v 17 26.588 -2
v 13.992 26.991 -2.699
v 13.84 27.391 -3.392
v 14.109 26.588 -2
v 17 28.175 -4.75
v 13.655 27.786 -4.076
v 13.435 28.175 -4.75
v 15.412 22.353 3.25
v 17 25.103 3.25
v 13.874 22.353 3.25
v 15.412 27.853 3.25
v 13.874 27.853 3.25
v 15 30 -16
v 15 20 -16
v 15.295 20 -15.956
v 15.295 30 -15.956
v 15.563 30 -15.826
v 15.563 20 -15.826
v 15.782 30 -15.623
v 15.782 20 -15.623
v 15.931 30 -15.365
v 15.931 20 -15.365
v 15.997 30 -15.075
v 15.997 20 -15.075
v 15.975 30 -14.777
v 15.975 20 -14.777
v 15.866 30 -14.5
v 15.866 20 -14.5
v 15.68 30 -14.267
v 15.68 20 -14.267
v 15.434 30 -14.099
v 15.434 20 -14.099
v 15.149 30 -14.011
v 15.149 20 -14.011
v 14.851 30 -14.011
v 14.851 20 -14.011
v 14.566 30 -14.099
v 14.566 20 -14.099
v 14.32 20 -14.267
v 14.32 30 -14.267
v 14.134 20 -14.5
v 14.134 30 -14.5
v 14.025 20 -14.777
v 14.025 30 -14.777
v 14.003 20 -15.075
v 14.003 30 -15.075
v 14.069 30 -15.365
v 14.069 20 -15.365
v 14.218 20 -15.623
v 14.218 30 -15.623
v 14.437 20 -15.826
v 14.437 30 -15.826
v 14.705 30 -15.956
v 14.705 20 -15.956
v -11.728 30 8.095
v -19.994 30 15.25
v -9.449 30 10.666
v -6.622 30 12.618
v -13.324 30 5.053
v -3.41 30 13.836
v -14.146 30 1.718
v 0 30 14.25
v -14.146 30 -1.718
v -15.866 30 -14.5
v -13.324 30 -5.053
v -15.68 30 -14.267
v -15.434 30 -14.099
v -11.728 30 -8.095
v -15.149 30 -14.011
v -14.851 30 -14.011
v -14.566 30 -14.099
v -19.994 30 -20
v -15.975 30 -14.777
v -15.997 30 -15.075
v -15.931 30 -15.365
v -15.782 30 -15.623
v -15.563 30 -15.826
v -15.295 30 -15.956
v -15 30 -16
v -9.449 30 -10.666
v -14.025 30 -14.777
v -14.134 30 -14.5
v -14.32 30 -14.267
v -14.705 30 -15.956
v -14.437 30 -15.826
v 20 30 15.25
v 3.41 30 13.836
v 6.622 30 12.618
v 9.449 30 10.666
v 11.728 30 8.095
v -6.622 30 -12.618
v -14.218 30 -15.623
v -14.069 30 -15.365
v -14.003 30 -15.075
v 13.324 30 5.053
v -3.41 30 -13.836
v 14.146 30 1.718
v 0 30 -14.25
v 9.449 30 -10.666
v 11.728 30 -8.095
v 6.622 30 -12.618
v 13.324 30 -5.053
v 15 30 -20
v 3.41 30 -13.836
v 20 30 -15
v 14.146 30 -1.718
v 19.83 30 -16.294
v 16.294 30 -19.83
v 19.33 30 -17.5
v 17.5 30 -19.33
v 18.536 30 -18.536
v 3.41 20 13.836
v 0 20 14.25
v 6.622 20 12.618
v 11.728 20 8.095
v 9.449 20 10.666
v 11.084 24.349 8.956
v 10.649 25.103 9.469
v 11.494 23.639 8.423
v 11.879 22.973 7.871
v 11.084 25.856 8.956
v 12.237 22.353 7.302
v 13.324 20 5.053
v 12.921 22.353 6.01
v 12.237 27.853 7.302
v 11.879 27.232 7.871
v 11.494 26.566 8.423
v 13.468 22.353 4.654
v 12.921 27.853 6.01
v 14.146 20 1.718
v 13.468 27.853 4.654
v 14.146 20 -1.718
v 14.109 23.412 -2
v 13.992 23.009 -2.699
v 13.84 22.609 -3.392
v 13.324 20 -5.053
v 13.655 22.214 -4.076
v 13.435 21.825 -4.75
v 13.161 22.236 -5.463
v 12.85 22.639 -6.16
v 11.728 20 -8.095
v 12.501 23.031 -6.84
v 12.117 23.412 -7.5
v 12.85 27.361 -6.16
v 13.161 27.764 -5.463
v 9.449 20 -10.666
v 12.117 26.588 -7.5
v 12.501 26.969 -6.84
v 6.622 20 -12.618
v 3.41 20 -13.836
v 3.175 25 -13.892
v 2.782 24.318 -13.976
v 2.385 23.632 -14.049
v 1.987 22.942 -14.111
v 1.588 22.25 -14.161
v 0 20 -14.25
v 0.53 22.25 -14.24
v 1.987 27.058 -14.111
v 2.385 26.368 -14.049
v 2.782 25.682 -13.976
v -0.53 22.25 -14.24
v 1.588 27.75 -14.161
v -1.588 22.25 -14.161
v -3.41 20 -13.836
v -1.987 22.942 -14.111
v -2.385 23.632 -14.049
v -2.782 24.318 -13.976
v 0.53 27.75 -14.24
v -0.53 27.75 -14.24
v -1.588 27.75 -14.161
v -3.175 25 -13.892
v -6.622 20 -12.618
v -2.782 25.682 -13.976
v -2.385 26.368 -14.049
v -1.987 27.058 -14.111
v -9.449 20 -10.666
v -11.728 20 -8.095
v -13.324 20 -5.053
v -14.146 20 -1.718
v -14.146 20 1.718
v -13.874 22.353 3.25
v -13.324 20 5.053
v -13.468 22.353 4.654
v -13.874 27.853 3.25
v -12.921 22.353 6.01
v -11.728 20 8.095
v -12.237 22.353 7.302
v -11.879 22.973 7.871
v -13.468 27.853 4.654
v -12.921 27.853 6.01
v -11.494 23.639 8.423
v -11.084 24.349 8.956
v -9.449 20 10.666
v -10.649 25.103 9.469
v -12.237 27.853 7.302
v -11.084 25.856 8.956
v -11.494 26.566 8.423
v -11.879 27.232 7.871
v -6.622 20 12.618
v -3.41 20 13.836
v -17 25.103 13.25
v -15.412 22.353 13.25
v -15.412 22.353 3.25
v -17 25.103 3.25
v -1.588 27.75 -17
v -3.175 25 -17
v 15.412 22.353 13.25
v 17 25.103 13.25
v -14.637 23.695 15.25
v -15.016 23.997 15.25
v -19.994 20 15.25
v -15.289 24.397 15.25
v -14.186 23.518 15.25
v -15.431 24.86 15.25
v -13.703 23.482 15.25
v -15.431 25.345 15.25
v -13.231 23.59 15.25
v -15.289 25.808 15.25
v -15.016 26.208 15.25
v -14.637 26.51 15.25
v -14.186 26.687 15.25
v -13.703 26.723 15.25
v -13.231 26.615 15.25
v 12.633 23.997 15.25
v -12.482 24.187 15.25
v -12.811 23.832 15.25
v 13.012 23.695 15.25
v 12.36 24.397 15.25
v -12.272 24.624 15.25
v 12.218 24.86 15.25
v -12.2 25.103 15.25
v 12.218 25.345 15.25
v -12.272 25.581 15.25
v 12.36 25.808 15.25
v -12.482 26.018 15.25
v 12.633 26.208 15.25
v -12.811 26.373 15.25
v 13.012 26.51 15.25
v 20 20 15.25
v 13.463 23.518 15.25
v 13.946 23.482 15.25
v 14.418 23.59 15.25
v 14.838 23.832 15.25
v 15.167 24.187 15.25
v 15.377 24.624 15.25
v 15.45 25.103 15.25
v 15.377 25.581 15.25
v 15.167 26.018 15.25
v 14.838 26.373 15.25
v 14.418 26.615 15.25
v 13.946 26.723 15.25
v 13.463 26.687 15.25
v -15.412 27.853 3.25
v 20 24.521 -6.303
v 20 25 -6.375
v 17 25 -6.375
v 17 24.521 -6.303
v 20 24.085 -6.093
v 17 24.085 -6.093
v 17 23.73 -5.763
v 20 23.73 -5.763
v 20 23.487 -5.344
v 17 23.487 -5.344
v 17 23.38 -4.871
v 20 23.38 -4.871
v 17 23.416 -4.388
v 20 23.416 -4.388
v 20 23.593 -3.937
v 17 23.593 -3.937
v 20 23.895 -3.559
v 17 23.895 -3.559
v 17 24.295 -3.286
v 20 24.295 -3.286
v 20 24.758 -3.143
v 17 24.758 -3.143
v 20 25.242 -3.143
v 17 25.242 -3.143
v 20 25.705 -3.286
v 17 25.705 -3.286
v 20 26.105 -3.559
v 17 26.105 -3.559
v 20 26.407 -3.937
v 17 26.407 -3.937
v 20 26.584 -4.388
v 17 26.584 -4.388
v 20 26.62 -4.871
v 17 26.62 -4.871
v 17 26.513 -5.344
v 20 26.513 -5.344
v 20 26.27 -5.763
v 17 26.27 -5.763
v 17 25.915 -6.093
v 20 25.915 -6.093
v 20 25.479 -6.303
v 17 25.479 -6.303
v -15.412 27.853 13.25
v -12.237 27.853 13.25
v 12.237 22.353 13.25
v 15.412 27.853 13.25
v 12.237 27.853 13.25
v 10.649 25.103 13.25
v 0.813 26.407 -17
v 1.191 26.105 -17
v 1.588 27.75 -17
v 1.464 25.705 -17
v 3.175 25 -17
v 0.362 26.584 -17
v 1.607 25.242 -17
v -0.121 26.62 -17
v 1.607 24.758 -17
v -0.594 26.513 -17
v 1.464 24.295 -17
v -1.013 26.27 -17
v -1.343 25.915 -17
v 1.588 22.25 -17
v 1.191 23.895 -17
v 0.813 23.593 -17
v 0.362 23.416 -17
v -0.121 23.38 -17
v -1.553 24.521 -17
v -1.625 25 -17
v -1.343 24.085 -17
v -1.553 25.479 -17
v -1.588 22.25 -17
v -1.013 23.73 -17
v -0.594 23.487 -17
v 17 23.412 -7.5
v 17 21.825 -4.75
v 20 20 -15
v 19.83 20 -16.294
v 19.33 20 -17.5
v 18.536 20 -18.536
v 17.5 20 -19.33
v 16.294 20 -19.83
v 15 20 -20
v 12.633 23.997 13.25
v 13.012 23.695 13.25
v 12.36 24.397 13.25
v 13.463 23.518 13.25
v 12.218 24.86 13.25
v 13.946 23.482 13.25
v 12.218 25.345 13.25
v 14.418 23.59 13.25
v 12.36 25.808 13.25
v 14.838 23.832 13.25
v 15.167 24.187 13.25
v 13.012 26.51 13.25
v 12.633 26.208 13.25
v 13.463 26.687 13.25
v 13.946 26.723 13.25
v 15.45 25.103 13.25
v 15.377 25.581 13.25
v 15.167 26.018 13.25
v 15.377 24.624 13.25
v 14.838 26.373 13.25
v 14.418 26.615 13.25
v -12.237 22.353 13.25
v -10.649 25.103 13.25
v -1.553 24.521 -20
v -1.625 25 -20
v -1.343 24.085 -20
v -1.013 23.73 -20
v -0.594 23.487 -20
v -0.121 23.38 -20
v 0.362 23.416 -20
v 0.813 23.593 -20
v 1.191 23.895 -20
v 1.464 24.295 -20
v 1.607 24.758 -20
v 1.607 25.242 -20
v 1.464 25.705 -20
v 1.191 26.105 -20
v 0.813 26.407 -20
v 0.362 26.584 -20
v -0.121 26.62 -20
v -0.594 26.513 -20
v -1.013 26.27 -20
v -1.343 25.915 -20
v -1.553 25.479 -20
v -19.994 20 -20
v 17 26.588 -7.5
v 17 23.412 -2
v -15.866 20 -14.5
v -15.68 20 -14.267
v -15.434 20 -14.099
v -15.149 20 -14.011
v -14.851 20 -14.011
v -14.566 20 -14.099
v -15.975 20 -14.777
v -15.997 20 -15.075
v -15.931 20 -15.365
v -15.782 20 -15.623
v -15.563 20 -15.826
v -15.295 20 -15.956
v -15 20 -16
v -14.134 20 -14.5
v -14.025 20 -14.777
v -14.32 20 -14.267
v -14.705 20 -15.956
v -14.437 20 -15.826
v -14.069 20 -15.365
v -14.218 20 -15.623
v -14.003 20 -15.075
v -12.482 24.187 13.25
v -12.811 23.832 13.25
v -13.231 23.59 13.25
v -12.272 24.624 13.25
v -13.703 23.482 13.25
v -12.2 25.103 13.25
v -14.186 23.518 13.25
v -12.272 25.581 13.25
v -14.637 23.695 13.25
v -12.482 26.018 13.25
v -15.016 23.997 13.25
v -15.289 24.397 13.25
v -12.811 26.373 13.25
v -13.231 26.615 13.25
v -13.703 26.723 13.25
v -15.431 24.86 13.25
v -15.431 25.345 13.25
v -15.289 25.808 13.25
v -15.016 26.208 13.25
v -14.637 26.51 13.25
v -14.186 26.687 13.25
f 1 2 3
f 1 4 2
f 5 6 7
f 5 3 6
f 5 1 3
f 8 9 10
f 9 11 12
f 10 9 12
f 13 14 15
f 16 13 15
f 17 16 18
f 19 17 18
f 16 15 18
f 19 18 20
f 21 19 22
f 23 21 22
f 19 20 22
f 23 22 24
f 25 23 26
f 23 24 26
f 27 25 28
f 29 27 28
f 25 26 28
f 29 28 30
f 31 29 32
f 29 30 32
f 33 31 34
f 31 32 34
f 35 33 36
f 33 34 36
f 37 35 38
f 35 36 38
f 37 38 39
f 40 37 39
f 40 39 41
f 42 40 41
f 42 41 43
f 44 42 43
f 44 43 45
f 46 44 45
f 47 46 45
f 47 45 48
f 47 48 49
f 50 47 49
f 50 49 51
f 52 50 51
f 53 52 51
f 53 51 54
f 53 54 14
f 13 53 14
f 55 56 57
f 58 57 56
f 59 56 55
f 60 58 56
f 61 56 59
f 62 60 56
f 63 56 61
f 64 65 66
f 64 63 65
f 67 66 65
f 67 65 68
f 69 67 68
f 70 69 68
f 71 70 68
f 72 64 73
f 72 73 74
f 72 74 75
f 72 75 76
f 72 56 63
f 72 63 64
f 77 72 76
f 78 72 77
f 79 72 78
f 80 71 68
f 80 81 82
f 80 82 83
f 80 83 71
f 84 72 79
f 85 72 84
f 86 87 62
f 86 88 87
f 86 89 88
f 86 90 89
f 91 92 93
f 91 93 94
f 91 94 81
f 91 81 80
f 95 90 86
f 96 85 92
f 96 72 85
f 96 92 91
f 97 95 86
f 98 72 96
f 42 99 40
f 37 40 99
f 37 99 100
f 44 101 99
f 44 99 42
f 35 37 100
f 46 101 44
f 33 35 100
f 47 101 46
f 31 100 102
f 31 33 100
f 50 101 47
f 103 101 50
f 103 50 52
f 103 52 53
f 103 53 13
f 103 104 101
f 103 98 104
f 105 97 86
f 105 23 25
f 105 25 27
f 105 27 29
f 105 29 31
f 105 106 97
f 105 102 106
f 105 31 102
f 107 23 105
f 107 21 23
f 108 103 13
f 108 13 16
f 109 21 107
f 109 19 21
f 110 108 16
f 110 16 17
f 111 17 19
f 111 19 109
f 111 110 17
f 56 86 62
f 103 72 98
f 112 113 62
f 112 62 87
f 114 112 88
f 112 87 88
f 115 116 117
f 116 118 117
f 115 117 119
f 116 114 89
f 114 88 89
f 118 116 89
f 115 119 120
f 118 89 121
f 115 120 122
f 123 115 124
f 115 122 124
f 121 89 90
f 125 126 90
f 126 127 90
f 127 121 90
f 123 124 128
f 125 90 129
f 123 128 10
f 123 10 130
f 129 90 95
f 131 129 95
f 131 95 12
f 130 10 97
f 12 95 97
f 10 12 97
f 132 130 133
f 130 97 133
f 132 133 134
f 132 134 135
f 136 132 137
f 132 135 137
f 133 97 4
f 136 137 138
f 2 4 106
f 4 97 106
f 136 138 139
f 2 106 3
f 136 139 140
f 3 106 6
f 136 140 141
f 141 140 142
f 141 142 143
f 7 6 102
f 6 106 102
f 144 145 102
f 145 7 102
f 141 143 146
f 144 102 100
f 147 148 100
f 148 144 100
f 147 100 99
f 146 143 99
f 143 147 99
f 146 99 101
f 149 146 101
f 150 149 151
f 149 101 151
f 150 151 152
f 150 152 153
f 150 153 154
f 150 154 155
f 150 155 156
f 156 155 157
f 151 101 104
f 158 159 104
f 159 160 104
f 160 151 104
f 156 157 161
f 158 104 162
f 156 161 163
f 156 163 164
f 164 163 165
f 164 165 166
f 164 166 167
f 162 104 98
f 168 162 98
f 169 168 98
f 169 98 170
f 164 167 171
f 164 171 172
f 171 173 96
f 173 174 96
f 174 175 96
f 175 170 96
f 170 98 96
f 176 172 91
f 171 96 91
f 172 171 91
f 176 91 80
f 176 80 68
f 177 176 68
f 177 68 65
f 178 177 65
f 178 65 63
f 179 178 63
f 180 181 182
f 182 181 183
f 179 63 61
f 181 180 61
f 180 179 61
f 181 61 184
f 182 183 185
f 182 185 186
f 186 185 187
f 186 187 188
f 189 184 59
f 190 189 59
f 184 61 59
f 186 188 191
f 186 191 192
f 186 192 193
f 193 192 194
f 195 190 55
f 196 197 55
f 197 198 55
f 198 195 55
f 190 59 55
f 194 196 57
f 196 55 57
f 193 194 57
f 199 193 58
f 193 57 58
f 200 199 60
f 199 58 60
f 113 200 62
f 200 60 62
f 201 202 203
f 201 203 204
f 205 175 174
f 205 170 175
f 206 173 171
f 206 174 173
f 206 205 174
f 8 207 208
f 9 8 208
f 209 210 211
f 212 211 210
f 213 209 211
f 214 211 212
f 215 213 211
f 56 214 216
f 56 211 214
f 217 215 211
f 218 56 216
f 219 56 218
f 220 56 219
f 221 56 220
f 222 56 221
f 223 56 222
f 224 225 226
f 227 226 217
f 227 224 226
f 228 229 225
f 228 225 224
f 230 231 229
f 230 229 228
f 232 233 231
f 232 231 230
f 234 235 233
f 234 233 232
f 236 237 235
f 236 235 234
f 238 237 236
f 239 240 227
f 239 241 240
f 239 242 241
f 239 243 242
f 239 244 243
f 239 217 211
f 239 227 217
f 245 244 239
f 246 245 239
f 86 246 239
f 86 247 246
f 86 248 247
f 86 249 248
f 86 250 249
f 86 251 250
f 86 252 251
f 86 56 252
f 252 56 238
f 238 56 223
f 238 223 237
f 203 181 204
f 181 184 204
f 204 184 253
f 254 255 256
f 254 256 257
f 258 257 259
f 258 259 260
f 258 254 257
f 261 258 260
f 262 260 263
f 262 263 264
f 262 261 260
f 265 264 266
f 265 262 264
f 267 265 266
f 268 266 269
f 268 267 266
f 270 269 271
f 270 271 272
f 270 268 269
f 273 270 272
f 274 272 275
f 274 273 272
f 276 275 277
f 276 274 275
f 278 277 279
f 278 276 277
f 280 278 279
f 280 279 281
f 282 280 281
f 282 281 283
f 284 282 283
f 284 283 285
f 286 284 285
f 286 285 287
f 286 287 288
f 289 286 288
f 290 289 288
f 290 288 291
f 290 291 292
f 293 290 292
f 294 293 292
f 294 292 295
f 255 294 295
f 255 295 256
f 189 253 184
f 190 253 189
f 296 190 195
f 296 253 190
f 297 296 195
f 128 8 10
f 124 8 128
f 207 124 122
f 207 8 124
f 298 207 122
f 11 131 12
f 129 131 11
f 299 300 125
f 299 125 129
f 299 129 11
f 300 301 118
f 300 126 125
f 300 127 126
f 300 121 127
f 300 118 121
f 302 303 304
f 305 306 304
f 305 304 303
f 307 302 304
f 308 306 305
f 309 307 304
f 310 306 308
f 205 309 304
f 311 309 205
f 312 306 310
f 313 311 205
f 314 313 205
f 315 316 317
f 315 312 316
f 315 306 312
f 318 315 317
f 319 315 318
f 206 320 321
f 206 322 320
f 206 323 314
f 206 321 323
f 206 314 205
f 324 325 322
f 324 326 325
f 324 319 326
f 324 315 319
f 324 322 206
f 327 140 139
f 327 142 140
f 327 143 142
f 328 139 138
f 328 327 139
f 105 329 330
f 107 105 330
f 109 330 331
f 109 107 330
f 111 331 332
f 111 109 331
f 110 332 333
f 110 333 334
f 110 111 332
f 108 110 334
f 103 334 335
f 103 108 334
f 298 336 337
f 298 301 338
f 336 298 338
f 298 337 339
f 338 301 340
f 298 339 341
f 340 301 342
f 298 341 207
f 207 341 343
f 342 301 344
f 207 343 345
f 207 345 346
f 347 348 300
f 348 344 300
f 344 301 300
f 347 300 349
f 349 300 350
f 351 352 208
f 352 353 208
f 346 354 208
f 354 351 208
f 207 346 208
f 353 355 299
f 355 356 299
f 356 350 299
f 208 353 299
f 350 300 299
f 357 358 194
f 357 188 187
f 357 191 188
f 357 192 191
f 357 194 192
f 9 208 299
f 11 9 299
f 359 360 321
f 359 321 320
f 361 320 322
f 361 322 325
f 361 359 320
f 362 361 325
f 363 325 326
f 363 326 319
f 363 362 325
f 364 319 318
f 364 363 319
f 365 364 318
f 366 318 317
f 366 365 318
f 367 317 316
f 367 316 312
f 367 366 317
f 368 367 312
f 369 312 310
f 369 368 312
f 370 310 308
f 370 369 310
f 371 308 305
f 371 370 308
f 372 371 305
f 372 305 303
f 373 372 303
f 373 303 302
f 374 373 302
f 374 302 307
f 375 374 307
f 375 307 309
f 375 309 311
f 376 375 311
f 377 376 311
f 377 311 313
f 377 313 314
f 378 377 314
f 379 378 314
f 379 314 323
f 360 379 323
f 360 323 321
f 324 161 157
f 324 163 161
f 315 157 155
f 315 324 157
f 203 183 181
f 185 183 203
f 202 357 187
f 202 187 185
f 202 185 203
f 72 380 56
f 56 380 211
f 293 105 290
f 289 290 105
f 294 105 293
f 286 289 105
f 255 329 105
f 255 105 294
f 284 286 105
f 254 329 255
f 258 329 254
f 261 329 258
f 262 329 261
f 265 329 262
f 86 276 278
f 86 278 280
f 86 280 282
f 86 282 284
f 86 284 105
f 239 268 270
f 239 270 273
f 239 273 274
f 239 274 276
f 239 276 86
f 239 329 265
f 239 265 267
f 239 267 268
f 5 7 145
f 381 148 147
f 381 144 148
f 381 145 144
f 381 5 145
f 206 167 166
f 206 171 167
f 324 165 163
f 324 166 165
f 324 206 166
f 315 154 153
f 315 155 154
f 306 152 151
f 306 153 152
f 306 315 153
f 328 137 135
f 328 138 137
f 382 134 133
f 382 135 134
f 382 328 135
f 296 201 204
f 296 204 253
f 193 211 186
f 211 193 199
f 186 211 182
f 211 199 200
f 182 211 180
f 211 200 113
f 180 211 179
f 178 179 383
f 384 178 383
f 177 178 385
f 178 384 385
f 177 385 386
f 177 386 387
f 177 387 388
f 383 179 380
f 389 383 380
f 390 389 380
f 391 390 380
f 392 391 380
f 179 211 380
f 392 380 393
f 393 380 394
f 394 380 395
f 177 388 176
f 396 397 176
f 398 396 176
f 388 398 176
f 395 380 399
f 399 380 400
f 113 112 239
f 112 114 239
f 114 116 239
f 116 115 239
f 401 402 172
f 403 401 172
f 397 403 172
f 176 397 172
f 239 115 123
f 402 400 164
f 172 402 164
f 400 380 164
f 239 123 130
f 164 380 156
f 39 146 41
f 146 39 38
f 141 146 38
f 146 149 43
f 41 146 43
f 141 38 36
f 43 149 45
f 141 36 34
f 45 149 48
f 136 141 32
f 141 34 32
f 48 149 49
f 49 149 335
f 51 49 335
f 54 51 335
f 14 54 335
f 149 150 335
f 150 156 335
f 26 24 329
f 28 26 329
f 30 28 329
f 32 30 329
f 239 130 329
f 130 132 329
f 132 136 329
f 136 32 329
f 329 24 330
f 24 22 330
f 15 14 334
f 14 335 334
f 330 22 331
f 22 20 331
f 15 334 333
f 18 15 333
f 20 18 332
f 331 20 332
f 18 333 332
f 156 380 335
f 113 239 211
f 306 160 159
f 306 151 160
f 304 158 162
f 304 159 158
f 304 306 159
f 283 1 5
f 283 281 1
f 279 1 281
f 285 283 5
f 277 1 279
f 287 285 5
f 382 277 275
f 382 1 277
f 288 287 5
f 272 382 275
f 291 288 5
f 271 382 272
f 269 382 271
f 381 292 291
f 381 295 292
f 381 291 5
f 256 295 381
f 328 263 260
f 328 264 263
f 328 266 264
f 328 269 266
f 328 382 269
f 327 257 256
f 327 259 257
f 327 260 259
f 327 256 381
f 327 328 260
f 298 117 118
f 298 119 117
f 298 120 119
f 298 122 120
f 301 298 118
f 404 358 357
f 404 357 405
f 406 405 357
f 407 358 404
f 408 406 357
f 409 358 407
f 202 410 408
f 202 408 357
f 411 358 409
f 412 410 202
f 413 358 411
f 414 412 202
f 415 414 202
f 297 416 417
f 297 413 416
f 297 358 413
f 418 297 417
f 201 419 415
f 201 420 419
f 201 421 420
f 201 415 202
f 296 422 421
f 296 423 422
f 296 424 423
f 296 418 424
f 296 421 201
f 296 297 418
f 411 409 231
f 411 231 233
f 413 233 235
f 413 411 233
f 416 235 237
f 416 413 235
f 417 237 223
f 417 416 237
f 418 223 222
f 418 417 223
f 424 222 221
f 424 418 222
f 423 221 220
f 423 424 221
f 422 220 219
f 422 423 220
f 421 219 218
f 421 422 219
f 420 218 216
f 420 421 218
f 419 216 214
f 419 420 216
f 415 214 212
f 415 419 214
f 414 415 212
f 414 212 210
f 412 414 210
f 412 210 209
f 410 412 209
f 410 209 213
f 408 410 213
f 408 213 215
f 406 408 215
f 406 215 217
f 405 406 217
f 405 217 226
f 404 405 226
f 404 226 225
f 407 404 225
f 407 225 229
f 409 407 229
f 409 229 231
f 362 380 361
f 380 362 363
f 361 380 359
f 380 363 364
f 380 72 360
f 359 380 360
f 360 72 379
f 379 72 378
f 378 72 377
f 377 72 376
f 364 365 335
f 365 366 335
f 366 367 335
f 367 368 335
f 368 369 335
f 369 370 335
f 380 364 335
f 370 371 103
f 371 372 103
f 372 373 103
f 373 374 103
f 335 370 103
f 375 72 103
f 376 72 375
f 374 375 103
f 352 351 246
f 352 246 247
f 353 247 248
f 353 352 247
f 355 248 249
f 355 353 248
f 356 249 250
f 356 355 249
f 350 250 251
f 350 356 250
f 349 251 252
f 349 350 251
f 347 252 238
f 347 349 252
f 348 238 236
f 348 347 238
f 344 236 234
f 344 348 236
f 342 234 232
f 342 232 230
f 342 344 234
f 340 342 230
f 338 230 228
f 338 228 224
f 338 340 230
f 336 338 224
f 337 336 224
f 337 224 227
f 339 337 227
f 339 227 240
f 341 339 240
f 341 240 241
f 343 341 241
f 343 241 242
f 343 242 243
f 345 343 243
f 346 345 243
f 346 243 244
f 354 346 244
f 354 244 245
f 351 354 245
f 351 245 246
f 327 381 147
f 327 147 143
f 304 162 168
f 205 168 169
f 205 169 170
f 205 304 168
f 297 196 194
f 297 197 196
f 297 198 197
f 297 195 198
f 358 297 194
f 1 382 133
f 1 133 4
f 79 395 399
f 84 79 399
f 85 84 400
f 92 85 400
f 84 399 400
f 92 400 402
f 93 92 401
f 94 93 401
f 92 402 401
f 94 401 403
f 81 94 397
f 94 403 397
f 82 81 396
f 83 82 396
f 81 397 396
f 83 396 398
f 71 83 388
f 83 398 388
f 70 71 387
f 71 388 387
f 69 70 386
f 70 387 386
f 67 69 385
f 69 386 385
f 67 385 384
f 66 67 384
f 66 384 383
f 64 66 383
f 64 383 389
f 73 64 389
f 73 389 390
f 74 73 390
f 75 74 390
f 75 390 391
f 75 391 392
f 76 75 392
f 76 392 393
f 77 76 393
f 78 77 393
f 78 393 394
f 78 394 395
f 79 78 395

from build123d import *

# Parameters (mm, degrees)
CROQUIS1_R                              = 15.25
CROQUIS1_R_2                            = 2.125
SOPORTE_CAJA_REDUCTORA_DEPTH            = 20
CROQUIS3_R                              = 2.125
CORTAR_EXTRUIR1_DEPTH                   = 51.423828692
REDONDEO1_R                             = 5
BOSS_EXTRUDE1_DEPTH                     = 20
CUT_EXTRUDE1_REACH                      = 55.852
SKETCH2_R                               = 1.625
CUT_EXTRUDE2_DEPTH                      = 2
SKETCH4_R                               = 1.625
CUT_EXTRUDE3_DEPTH                      = 63.291652731
CUT_EXTRUDE4_START                      = -4.5
CUT_EXTRUDE4_DEPTH                      = 2
CROQUIS6_W                              = 4.75
CROQUIS6_H                              = 4.75
CORTAR_EXTRUIR17_DEPTH                  = 42.231056256
CROQUIS7_W                              = 60
CROQUIS7_H                              = 20
CORTAR_EXTRUIR18_DEPTH                  = 51.423828692
SALIENTE_EXTRUIR2_DEPTH                 = 49
SOPORTE_START                           = -15
SOPORTE_MOTOR_DEPTH                     = 15
CROQUIS12_R                             = 2.125
AGUJEROS_DE_SUJECION_A_BASE_DEPTH       = 84.087679592
TUERCA_START                            = -4
TUERCA_AGUJERO_DE_SUJECION_A_BASE_DEPTH = 10
SALIENTE_EXTRUIR4_DEPTH                 = 15
CORTAR_EXTRUIR19_DEPTH                  = 25
CROQUIS14_W                             = 50
CROQUIS14_H                             = 118
CORTAR_EXTRUIR22_DEPTH                  = 146.556045907
CROQUIS15_W                             = 10
CROQUIS15_H                             = 7
CORTAR_EXTRUIR23_DEPTH                  = 42.231056256
CORTAR_EXTRUIR24_DEPTH                  = 42.231056256
CROQUIS18_W                             = 40
CROQUIS18_H                             = 10
CORTAR_EXTRUIR25_DEPTH                  = 44.27311521
SALIENTE_EXTRUIR5_DEPTH                 = 10
CROQUIS20_R                             = 1
CORTAR_EXTRUIR26_DEPTH                  = 49.229270158
CORTAR_EXTRUIR27_REACH                  = 62.959
CORTAR_EXTRUIR27_END_RADIUS             = 15.25
CROQUIS21_R                             = 1.625
CROQUIS22_R                             = 2.125
CROQUIS22_R_2                           = 1
SALIENTE_EXTRUIR6_DEPTH                 = 10
CROQUIS23_R                             = 1.625
CORTAR_EXTRUIR28_DEPTH                  = 52.269508521
CORTAR_EXTRUIR29_START                  = -3
CORTAR_EXTRUIR29_DEPTH                  = 10
SALIENTE_EXTRUIR7_DEPTH                 = 10
CORTAR_EXTRUIR30_REACH                  = 72.235
CROQUIS27_R                             = 1.625
CORTAR_EXTRUIR31_REACH                  = 75.235
CORTAR_EXTRUIR31_START                  = -3
CORTAR_EXTRUIR32_REACH                  = 58.612
CROQUIS29_R                             = 1.625
CORTAR_EXTRUIR33_REACH                  = 61.112
CORTAR_EXTRUIR33_START                  = -2.5
CROQUIS35_W                             = 13.305418987
CROQUIS35_H                             = 6.826864192
CORTAR_EXTRUIR34_DEPTH                  = 63.931555098
CORTAR_EXTRUIR34_DEPTH_BACK             = 63.931555098
CORTAR_EXTRUIR35_START                  = -3
CORTAR_EXTRUIR35_DEPTH                  = 10
SALIENTE_EXTRUIR8_DEPTH                 = 10
SALIENTE_EXTRUIR9_DEPTH                 = 13
SALIENTE_EXTRUIR10_DEPTH                = 3
CROQUIS40_W                             = 106.583537839
CROQUIS40_H                             = 47.391515964
CORTAR_EXTRUIR36_DEPTH                  = 80.887064817
CORTAR_EXTRUIR36_DEPTH_BACK             = 80.887064817
CORTAR_EXTRUIR37_DEPTH                  = 67.2524009
CORTAR_EXTRUIR37_DEPTH_BACK             = 67.2524009
CORTAR_EXTRUIR38_DEPTH                  = 79.704784639
CORTAR_EXTRUIR38_DEPTH_BACK             = 79.704784639
SALIENTE_EXTRUIR11_DEPTH                = 10
CORTAR_EXTRUIR39_DEPTH                  = 63.9908649
CROQUIS45_W                             = 31.470301378
CROQUIS45_H                             = 10
CROQUIS45_R                             = 1.625
SALIENTE_EXTRUIR12_DEPTH                = 2.5
SALIENTE_EXTRUIR13_DEPTH                = 10
CORTAR_EXTRUIR40_START                  = -2
CROQUIS47_R                             = 1.625
CORTAR_EXTRUIR40_DEPTH                  = 10
CORTAR_EXTRUIR41_START                  = -12
CROQUIS48_R                             = 1.625
CORTAR_EXTRUIR41_DEPTH                  = 12
CROQUIS49_W                             = 34.796066513
CROQUIS49_H                             = 42.211026982
CORTAR_EXTRUIR42_DEPTH                  = 52.795622989
CORTAR_EXTRUIR42_DEPTH_BACK             = 52.795622989
CROQUIS51_R                             = 15.25
CROQUIS51_R_2                           = 14.25
SALIENTE_EXTRUIR14_DEPTH                = 10
CORTAR_EXTRUIR43_DEPTH                  = 10
CORTAR_EXTRUIR44_DEPTH                  = 10
CORTAR_EXTRUIR45_DEPTH                  = 10
SALIENTE_EXTRUIR15_DEPTH                = 10


with BuildPart() as part:
    # Croquis1 → Soporte caja reductora (new body)
    with BuildSketch(Plane(origin=(0, 0, 0), x_dir=(1, 0, 0), z_dir=(0, 1, 0))):
        Polygon((-30, -15.25), (-20, -15.25), (-20, -20), (20, -20), (20, -15.25), (30, -15.25), (30, -7.25), (20, -4.25), (20, 20), (-20, 20), (-20, -4.25), (-30, -7.25), align=None)
        with Locations(Location((0, 0, 0), (0, 0, 270))):
            Circle(CROQUIS1_R, mode=Mode.SUBTRACT)
        with Locations(Location((-15, 15, 0), (0, 0, 270))):
            Circle(CROQUIS1_R_2, mode=Mode.SUBTRACT)
        with Locations(Location((15, 15, 0), (0, 0, 270))):
            Circle(CROQUIS1_R_2, mode=Mode.SUBTRACT)
    extrude(amount=-SOPORTE_CAJA_REDUCTORA_DEPTH)

    # Croquis3 → Cortar-Extruir1 (cut, through all)
    with BuildSketch(Plane.XY.offset(15.25)):
        with Locations((-23.5, -10)):
            Circle(CROQUIS3_R)
        with Locations((23.5, -10)):
            Circle(CROQUIS3_R)
    extrude(amount=-CORTAR_EXTRUIR1_DEPTH, mode=Mode.SUBTRACT)

    # Redondeo1
    redondeo1_edges = [part.edges().sort_by_distance(p)[0] for p in [
        (-20, -10, -20),
        (20, -10, -20),
    ]]
    fillet(redondeo1_edges, radius=REDONDEO1_R)

    # Sketch1 → Boss-Extrude1 (add)
    with BuildSketch(Plane(origin=(0, 0, 0), x_dir=(1, 0, 0), z_dir=(0, 1, 0))):
        with BuildLine():
            Line((25.5, 15), (20, 15))
            ThreePointArc((20, 15), (18.535533906, 18.535533906), (15, 20))
            Line((15, 20), (30, 20))
            Line((30, 20), (30, 8))
            Line((30, 8), (25.5, 8))
            Line((25.5, 8), (25.5, 15))
        make_face()
    extrude(amount=-BOSS_EXTRUDE1_DEPTH)

    # Sketch2 → Cut-Extrude1 (cut, up to next)
    with BuildSketch(Plane(origin=(0, 0, -20), x_dir=(-1, 0, 0), z_dir=(0, 0, -1)), mode=Mode.PRIVATE) as cut_extrude1_sk1:
        with Locations((-22.75, -10)):
            Circle(SKETCH2_R)
    cut_extrude1_tool1 = extrude(cut_extrude1_sk1.sketch, amount=-CUT_EXTRUDE1_REACH, mode=Mode.PRIVATE) & part.part
    add(cut_extrude1_tool1.solids().sort_by_distance((22.75, -10, -20))[0], mode=Mode.SUBTRACT)

    # Sketch3 → Cut-Extrude2 (cut)
    with BuildSketch(Plane.XY.offset(-15)):
        Polygon((20, -11.58771324), (22.75, -13.175426481), (25.5, -11.58771324), (25.5, -8.41228676), (22.75, -6.824573519), (20, -8.41228676), align=None)
    extrude(amount=-CUT_EXTRUDE2_DEPTH, mode=Mode.SUBTRACT)

    # Sketch4 → Cut-Extrude3 (cut, through all)
    with BuildSketch(Plane.ZY.offset(-25.5)):
        with Locations((-12.25, -10)):
            Circle(SKETCH4_R)
    extrude(amount=-CUT_EXTRUDE3_DEPTH, mode=Mode.SUBTRACT)

    # Sketch5 → Cut-Extrude4 (cut)
    with BuildSketch(Plane(origin=(30, 0, 0), x_dir=(0, 0, -1), z_dir=(1, 0, 0)).offset(CUT_EXTRUDE4_START)):
        Polygon((15, -11.58771324), (15, -8.41228676), (12.25, -6.824573519), (9.5, -8.41228676), (9.5, -11.58771324), (12.25, -13.175426481), align=None)
    extrude(amount=CUT_EXTRUDE4_DEPTH, mode=Mode.SUBTRACT)

    # Croquis6 → Cortar-Extruir17 (cut, through all)
    with BuildSketch(Plane(origin=(0, 0, 0), x_dir=(1, 0, 0), z_dir=(0, 1, 0))):
        Polygon((0, -15.25), (-15.25, -15.25), (-15.25, -20), (15.25, -20), (15.25, -15.25), align=None)
        with Locations((-17.625, -17.625)):
            Rectangle(CROQUIS6_W, CROQUIS6_H)
        with BuildLine():
            ThreePointArc((0, -15.25), (-10.783378413, -10.783378413), (-15.25, 0))
            Line((-15.25, 0), (-15.25, -15.25))
            Line((-15.25, -15.25), (0, -15.25))
        make_face()
        with BuildLine():
            Line((15.25, -15.25), (15.25, 0))
            ThreePointArc((15.25, 0), (10.783378413, -10.783378413), (0, -15.25))
            Line((0, -15.25), (15.25, -15.25))
        make_face()
        with Locations((17.625, -17.625)):
            Rectangle(CROQUIS6_W, CROQUIS6_H)
    extrude(amount=-CORTAR_EXTRUIR17_DEPTH, mode=Mode.SUBTRACT)


with BuildPart() as body_2:
    # Simetría1: mirrored copy
    add(part.part.mirror(Plane.ZX))

    # Croquis8 → Saliente-Extruir2 (add)
    with BuildSketch(Plane(origin=(0, 20, 0), x_dir=(1, 0, 0), z_dir=(0, 1, 0))):
        with BuildLine():
            Line((-12.664515522, 20), (-11.040489496, 13.939052358))
            Line((-11.040489496, 13.939052358), (-10.315162126, 11.232093763))
            ThreePointArc((-10.315162126, 11.232093763), (0, 15.25), (10.315162126, 11.232093763))
            Line((10.315162126, 11.232093763), (10.817418481, 13.87928066))
            Line((10.817418481, 13.87928066), (11.978715476, 20))
            Line((11.978715476, 20), (-12.664515522, 20))
        make_face()
    extrude(amount=SALIENTE_EXTRUIR2_DEPTH)

    # Croquis9 → Soporte motor (add)
    with BuildSketch(Plane(origin=(0, 69, 0), x_dir=(1, 0, 0), z_dir=(0, 1, 0)).offset(SOPORTE_START)):
        with BuildLine():
            Line((-20, 15), (-20, -4.25))
            Line((-20, -4.25), (-30, -7.25))
            Line((-30, -7.25), (-30, -15.25))
            Line((-30, -15.25), (0, -15.25))
            Line((0, -15.25), (0, -14.75))
            ThreePointArc((0, -14.75), (-10.429825023, 10.429825023), (14.75, 0))
            Line((14.75, 0), (20, 0))
            Line((20, 0), (20, 13.936837101))
            Line((20, 13.936837101), (12.664515522, 20))
            Line((12.664515522, 20), (-15, 20))
            ThreePointArc((-15, 20), (-18.535533906, 18.535533906), (-20, 15))
        make_face()
    extrude(amount=-SOPORTE_MOTOR_DEPTH)

    # Croquis12 → Agujeros de sujecion a base (cut, through all)
    with BuildSketch(Plane.XY.offset(15.25)):
        with Locations((-23.5, 46.5)):
            Circle(CROQUIS12_R)
    extrude(amount=-AGUJEROS_DE_SUJECION_A_BASE_DEPTH, mode=Mode.SUBTRACT)

    # Croquis13 → Tuerca Agujero de sujecion a base (cut)
    with BuildSketch(Plane.XY.offset(15.25).offset(TUERCA_START)):
        Polygon((-20, 44.479274058), (-20, 48.520725942), (-23.5, 50.541451884), (-27, 48.520725942), (-27, 44.479274058), (-23.5, 42.458548116), align=None)
    extrude(amount=-TUERCA_AGUJERO_DE_SUJECION_A_BASE_DEPTH, mode=Mode.SUBTRACT)

    # Croquis10 → Saliente-Extruir4 (add)
    with BuildSketch(Plane(origin=(0, 69, 0), x_dir=(1, 0, 0), z_dir=(0, 1, 0))):
        with BuildLine():
            ThreePointArc((10.315162126, 11.232093763), (0, 15.25), (-10.315162126, 11.232093763))
            Line((-10.315162126, 11.232093763), (-10.16850369, 10.684757026))
            ThreePointArc((-10.16850369, 10.684757026), (0, 14.75), (10.16850369, 10.684757026))
            Line((10.16850369, 10.684757026), (10.315162126, 11.232093763))
        make_face()
    extrude(amount=-SALIENTE_EXTRUIR4_DEPTH)

    # Croquis11 → Cortar-Extruir19 (cut)
    with BuildSketch(Plane.XZ):
        with BuildLine():
            Line((15.25, 4.25), (20, 4.25))
            Line((20, 4.25), (21.972856468, 4.84185694))
            ThreePointArc((21.972856468, 4.84185694), (19.948931102, 10.40625523), (16.543503257, 15.25))
            Line((16.543503257, 15.25), (15.25, 15.25))
            Line((15.25, 15.25), (15.25, 4.25))
        make_face()
        with BuildLine():
            Line((21.972856468, 4.84185694), (30, 7.25))
            Line((30, 7.25), (30, 15.25))
            Line((30, 15.25), (16.543503257, 15.25))
            ThreePointArc((16.543503257, 15.25), (19.948931102, 10.40625523), (21.972856468, 4.84185694))
        make_face()
        with BuildLine():
            ThreePointArc((20, -15), (18.535533906, -18.535533906), (15, -20))
            Line((15, -20), (30, -20))
            Line((30, -20), (30, -8))
            Line((30, -8), (25.5, -8))
            Line((25.5, -8), (25.5, -15))
            Line((25.5, -15), (20, -15))
        make_face()
    extrude(amount=-CORTAR_EXTRUIR19_DEPTH, mode=Mode.SUBTRACT)

    # Simetría2: body 2 across face


with BuildPart() as part_1:
    add(part.part)

    # Croquis7 → Cortar-Extruir18 (cut, through all)
    with BuildSketch(Plane(origin=(0, 0, -20), x_dir=(-1, 0, 0), z_dir=(0, 0, -1))):
        with Locations((0, -10)):
            Rectangle(CROQUIS7_W, CROQUIS7_H)
    extrude(amount=-CORTAR_EXTRUIR18_DEPTH, mode=Mode.SUBTRACT)


with BuildPart() as body_2_1:
    add(body_2.part)
    add(body_2.part.mirror(Plane(origin=(-0.229209569, 69, -16.663998028), x_dir=(0, 0, 1), z_dir=(0, 1, 0))))

    # Croquis14 → Cortar-Extruir22 (cut, through all)
    with BuildSketch(Plane.XY.offset(15.25)):
        with Locations((-5, 79)):
            Rectangle(CROQUIS14_W, CROQUIS14_H)
    extrude(amount=-CORTAR_EXTRUIR22_DEPTH, mode=Mode.SUBTRACT)

    # Croquis15 → Cortar-Extruir23 (cut, through all)
    with BuildSketch(Plane.XZ):
        with Locations((-25, 7.75)):
            Rectangle(CROQUIS15_W, CROQUIS15_H)
    extrude(amount=-CORTAR_EXTRUIR23_DEPTH, mode=Mode.SUBTRACT)

    # Croquis16 → Cortar-Extruir24 (cut, through all)
    with BuildSketch(Plane.XZ):
        Polygon((-30, 15.25), (-15.25, 15.25), (-15.25, 12.75), (-20, 12.75), (-20, 11.25), (-30, 11.25), (-30, 12.75), align=None)
    extrude(amount=-CORTAR_EXTRUIR24_DEPTH, mode=Mode.SUBTRACT)

    # Croquis18 → Cortar-Extruir25 (cut, through all)
    with BuildSketch(Plane(origin=(0, 0, -20), x_dir=(-1, 0, 0), z_dir=(0, 0, -1))):
        with Locations((0, 5)):
            Rectangle(CROQUIS18_W, CROQUIS18_H)
    extrude(amount=-CORTAR_EXTRUIR25_DEPTH, mode=Mode.SUBTRACT)

    # Croquis19 → Saliente-Extruir5 (add)
    with BuildSketch(Plane(origin=(0, 20, 0), x_dir=(1, 0, 0), z_dir=(0, 1, 0))):
        Polygon((-20, -12.75), (-34, -12.75), (-34, -7.75), (-24, -7.75), (-20, -3.75), align=None)
    extrude(amount=-SALIENTE_EXTRUIR5_DEPTH)

    # Croquis20 → Cortar-Extruir26 (cut, through all)
    with BuildSketch(Plane(origin=(0, 0, 7.75), x_dir=(-1, 0, 0), z_dir=(0, 0, -1))):
        with Locations((29, 15)):
            Circle(CROQUIS20_R)
    extrude(amount=-CORTAR_EXTRUIR26_DEPTH, mode=Mode.SUBTRACT)

    # Cortar-Extruir27: up to this cylinder (the profile starts outside it)
    cortar_extruir27_end = Plane(origin=(0, 15, 0), z_dir=(0, -1, 0)) * Cylinder(CORTAR_EXTRUIR27_END_RADIUS, 157.418, mode=Mode.PRIVATE)
    # Croquis21 → Cortar-Extruir27 (cut, up to the surface)
    with BuildSketch(Plane(origin=(20, 0, 0), x_dir=(0, 0, -1), z_dir=(1, 0, 0)), mode=Mode.PRIVATE) as cortar_extruir27_sk1:
        with Locations((4.75, 15)):
            Circle(CROQUIS21_R)
    cortar_extruir27_tool1 = extrude(cortar_extruir27_sk1.sketch, amount=-CORTAR_EXTRUIR27_REACH, mode=Mode.PRIVATE) - cortar_extruir27_end
    add(cortar_extruir27_tool1.solids().sort_by_distance((20, 15, -4.75))[0], mode=Mode.SUBTRACT)

    # Croquis22 → Saliente-Extruir6 (add)
    with BuildSketch(Plane.XZ.offset(-10)):
        with Locations((-15, -15)):
            Circle(CROQUIS22_R)
        with Locations(Location((-15, -15, 0), (0, 0, 270))):
            Circle(CROQUIS22_R_2, mode=Mode.SUBTRACT)
        with Locations((15, -15)):
            Circle(CROQUIS22_R)
        with Locations(Location((15, -15, 0), (0, 0, 270))):
            Circle(CROQUIS22_R_2, mode=Mode.SUBTRACT)
    extrude(amount=-SALIENTE_EXTRUIR6_DEPTH)

    # Croquis23 → Cortar-Extruir28 (cut, through all)
    with BuildSketch(Plane(origin=(0, 0, -20), x_dir=(-1, 0, 0), z_dir=(0, 0, -1))):
        with Locations((0, 15)):
            Circle(CROQUIS23_R)
    extrude(amount=-CORTAR_EXTRUIR28_DEPTH, mode=Mode.SUBTRACT)

    # Croquis24 → Cortar-Extruir29 (cut)
    with BuildSketch(Plane(origin=(0, 0, -20), x_dir=(-1, 0, 0), z_dir=(0, 0, -1)).offset(CORTAR_EXTRUIR29_START)):
        Polygon((1.58771324, 12.25), (3.175426481, 15), (1.58771324, 17.75), (-1.58771324, 17.75), (-3.175426481, 15), (-1.58771324, 12.25), align=None)
    extrude(amount=-CORTAR_EXTRUIR29_DEPTH, mode=Mode.SUBTRACT)

    # Croquis26 → Saliente-Extruir7 (add)
    with BuildSketch(Plane.XZ.offset(-10)):
        Polygon((-34, 7.75), (-34, 12.75), (-58.825, 12.75), (-39.160527763, -4.104491148), (-20, -4.104491148), (-20, -0.104491148), (-35.732113118, -0.104491148), (-29, 7.75), align=None)
        Polygon((-34.268209086, 7.75), (-39.594516123, 1.535690951), (-46.844874897, 7.75), align=None, mode=Mode.SUBTRACT)
    extrude(amount=-SALIENTE_EXTRUIR7_DEPTH)

    # Croquis27 → Cortar-Extruir30 (cut, up to next)
    with BuildSketch(Plane.XY.offset(12.75), mode=Mode.PRIVATE) as cortar_extruir30_sk1:
        with Locations((-40.544874897, 15)):
            Circle(CROQUIS27_R)
    cortar_extruir30_tool1 = extrude(cortar_extruir30_sk1.sketch, amount=-CORTAR_EXTRUIR30_REACH, mode=Mode.PRIVATE) & body_2_1.part
    # Croquis27 → Cortar-Extruir30 (cut, up to next)
    with BuildSketch(Plane.XY.offset(12.75), mode=Mode.PRIVATE) as cortar_extruir30_sk2:
        with Locations((-29, 15)):
            Circle(CROQUIS27_R)
    cortar_extruir30_tool2 = extrude(cortar_extruir30_sk2.sketch, amount=-CORTAR_EXTRUIR30_REACH, mode=Mode.PRIVATE) & body_2_1.part
    add(cortar_extruir30_tool1.solids().sort_by_distance((-40.544875, 15, 12.75))[0], mode=Mode.SUBTRACT)
    add(cortar_extruir30_tool2.solids().sort_by_distance((-29, 15, 12.75))[0], mode=Mode.SUBTRACT)

    # Croquis28 → Cortar-Extruir31 (cut, up to next)
    with BuildSketch(Plane.XY.offset(12.75).offset(CORTAR_EXTRUIR31_START), mode=Mode.PRIVATE) as cortar_extruir31_sk1:
        Polygon((-38.957161657, 12.25), (-37.369448416, 15), (-38.957161657, 17.75), (-42.132588137, 17.75), (-43.720301378, 15), (-42.132588137, 12.25), align=None)
    cortar_extruir31_tool1 = extrude(cortar_extruir31_sk1.sketch, amount=-CORTAR_EXTRUIR31_REACH, mode=Mode.PRIVATE) & body_2_1.part
    # Croquis28 → Cortar-Extruir31 (cut, up to next)
    with BuildSketch(Plane.XY.offset(12.75).offset(CORTAR_EXTRUIR31_START), mode=Mode.PRIVATE) as cortar_extruir31_sk2:
        Polygon((-27.41228676, 12.25), (-25.824573519, 15), (-27.41228676, 17.75), (-30.58771324, 17.75), (-32.175426481, 15), (-30.58771324, 12.25), align=None)
    cortar_extruir31_tool2 = extrude(cortar_extruir31_sk2.sketch, amount=-CORTAR_EXTRUIR31_REACH, mode=Mode.PRIVATE) & body_2_1.part
    add(cortar_extruir31_tool1.solids().sort_by_distance((-40.544875, 15, 9.75))[0], mode=Mode.SUBTRACT)
    add(cortar_extruir31_tool2.solids().sort_by_distance((-29, 15, 9.75))[0], mode=Mode.SUBTRACT)

    # Croquis29 → Cortar-Extruir32 (cut, up to next)
    with BuildSketch(Plane(origin=(-18.612848159, 0, -21.715982563), x_dir=(-0.7592713073348843, 0, 0.6507742172658468), z_dir=(-0.6507742172658468, 0, -0.7592713073348843)), mode=Mode.PRIVATE) as cortar_extruir32_sk1:
        with Locations((33.812368097, 15)):
            Circle(CROQUIS29_R)
    cortar_extruir32_tool1 = extrude(cortar_extruir32_sk1.sketch, amount=-CORTAR_EXTRUIR32_REACH, mode=Mode.PRIVATE) & body_2_1.part
    add(cortar_extruir32_tool1.solids().sort_by_distance((-44.285609, 15, 0.288235))[0], mode=Mode.SUBTRACT)

    # Croquis31 → Cortar-Extruir33 (cut, up to next)
    with BuildSketch(Plane(origin=(-18.612848159, 0, -21.715982563), x_dir=(-0.7592713073348843, 0, 0.6507742172658468), z_dir=(-0.6507742172658468, 0, -0.7592713073348843)).offset(CORTAR_EXTRUIR33_START), mode=Mode.PRIVATE) as cortar_extruir33_sk1:
        Polygon((36.562368097, 16.58771324), (33.812368097, 18.175426481), (31.062368097, 16.58771324), (31.062368097, 13.41228676), (33.812368097, 11.824573519), (36.562368097, 13.41228676), align=None)
    cortar_extruir33_tool1 = extrude(cortar_extruir33_sk1.sketch, amount=-CORTAR_EXTRUIR33_REACH, mode=Mode.PRIVATE) & body_2_1.part
    add(cortar_extruir33_tool1.solids().sort_by_distance((-42.658674, 15, 2.186413))[0], mode=Mode.SUBTRACT)

    # Croquis35 → Cortar-Extruir34 (cut, two sides)
    with BuildSketch(Plane(origin=(0, 20, 0), x_dir=(1, 0, 0), z_dir=(0, 1, 0))) as cortar_extruir34_sk:
        with Locations((17.04227466, -3.413432096)):
            Rectangle(CROQUIS35_W, CROQUIS35_H)
    extrude(amount=CORTAR_EXTRUIR34_DEPTH, mode=Mode.SUBTRACT)
    extrude(cortar_extruir34_sk.sketch, amount=-CORTAR_EXTRUIR34_DEPTH_BACK, mode=Mode.SUBTRACT)

    # Croquis36 → Cortar-Extruir35 (cut)
    with BuildSketch(Plane(origin=(20, 0, 0), x_dir=(0, 0, -1), z_dir=(1, 0, 0)).offset(CORTAR_EXTRUIR35_START)):
        Polygon((7.5, 16.58771324), (4.75, 18.175426481), (2, 16.58771324), (2, 13.41228676), (4.75, 11.824573519), (7.5, 13.41228676), align=None)
    extrude(amount=-CORTAR_EXTRUIR35_DEPTH, mode=Mode.SUBTRACT)

    # Croquis37 → Saliente-Extruir8 (add)
    with BuildSketch(Plane.XZ.offset(-10)):
        Polygon((-39.160527763, -4.104491148), (-20.614919368, -20), (-15, -20), (-19.558128305, -15.637570403), (-33.014002756, -4.104491148), align=None)
    extrude(amount=-SALIENTE_EXTRUIR8_DEPTH)

    # Croquis38 → Saliente-Extruir9 (add)
    with BuildSketch(Plane.XZ.offset(-10)):
        Polygon((-58.825, 12.75), (-38.825, 12.75), (-38.825, 9.75), (-55.324839942, 9.75), align=None)
    extrude(amount=SALIENTE_EXTRUIR9_DEPTH)

    # Croquis39 → Saliente-Extruir10 (add)
    with BuildSketch(Plane.XZ.offset(-10)):
        Polygon((-38.825, 9.75), (-38.825, 7.75), (-38.825, 5.75), (-50.657959865, 5.75), (-52.991399903, 7.75), (-55.324839942, 9.75), align=None)
    extrude(amount=SALIENTE_EXTRUIR10_DEPTH)

    # Simetría3: body 2 across face


with BuildPart() as body_2_2:
    add(body_2_1.part)
    add(body_2_1.part.mirror(Plane(origin=(-18.003999227, 20, -4.220503046), x_dir=(0, 0, 1), z_dir=(0, 1, 0))))

    # Croquis40 → Cortar-Extruir36 (cut, two sides)
    with BuildSketch(Plane(origin=(0, 0, -20), x_dir=(-1, 0, 0), z_dir=(0, 0, -1))) as cortar_extruir36_sk:
        with Locations((22.395502026, -3.695757982)):
            Rectangle(CROQUIS40_W, CROQUIS40_H)
    extrude(amount=CORTAR_EXTRUIR36_DEPTH, mode=Mode.SUBTRACT)
    extrude(cortar_extruir36_sk.sketch, amount=-CORTAR_EXTRUIR36_DEPTH_BACK, mode=Mode.SUBTRACT)

    # Croquis41 → Cortar-Extruir37 (cut, two sides)
    with BuildSketch(Plane.XZ.offset(-20)) as cortar_extruir37_sk:
        Polygon((-19.992980133, -22.302484261), (-20, 3.75), (-24, 7.75), (-56.035110209, 7.75), align=None)
    extrude(amount=CORTAR_EXTRUIR37_DEPTH, mode=Mode.SUBTRACT)
    extrude(cortar_extruir37_sk.sketch, amount=-CORTAR_EXTRUIR37_DEPTH_BACK, mode=Mode.SUBTRACT)

    # Croquis42 → Cortar-Extruir38 (cut, two sides)
    with BuildSketch(Plane(origin=(0, 0, 9.75), x_dir=(-1, 0, 0), z_dir=(0, 0, -1))) as cortar_extruir38_sk:
        Polygon((46.720301378, 20), (46.720301378, 30), (38.825, 30), (33.492952769, 43.760628779), (49.525340398, 48.951442806), (67.200390695, 42.512205152), (65.906601328, 20), (51.713995885, 13.864168239), align=None)
    extrude(amount=CORTAR_EXTRUIR38_DEPTH, mode=Mode.SUBTRACT)
    extrude(cortar_extruir38_sk.sketch, amount=-CORTAR_EXTRUIR38_DEPTH_BACK, mode=Mode.SUBTRACT)

    # Croquis43 → Saliente-Extruir11 (add)
    with BuildSketch(Plane.XZ.offset(-20)):
        Polygon((-19.993600539, -20), (-46.720301378, 7.75), (-43.839252857, 10.524807997), (-17.112552018, -17.225192003), align=None)
    extrude(amount=-SALIENTE_EXTRUIR11_DEPTH)

    # Croquis44 → Cortar-Extruir39 (cut, through all)
    with BuildSketch(Plane(origin=(0, 0, 9.75), x_dir=(-1, 0, 0), z_dir=(0, 0, -1))):
        Polygon((38.957161657, 27.75), (37.369448416, 25), (38.957161657, 22.25), (42.132588137, 22.25), (43.720301378, 25), (42.132588137, 27.75), align=None)
    extrude(amount=CORTAR_EXTRUIR39_DEPTH, mode=Mode.SUBTRACT)

    # Croquis45 → Saliente-Extruir12 (add)
    with BuildSketch(Plane.XY.offset(12.75)):
        with Locations((-30.985150689, 25)):
            Rectangle(CROQUIS45_W, CROQUIS45_H)
        with Locations((-40.544874897, 25)):
            Circle(CROQUIS45_R, mode=Mode.SUBTRACT)
        with Locations((-29, 25)):
            Circle(CROQUIS45_R, mode=Mode.SUBTRACT)
    extrude(amount=SALIENTE_EXTRUIR12_DEPTH)

    # Croquis46 → Saliente-Extruir13 (add)
    with BuildSketch(Plane.XZ.offset(-20)):
        with BuildLine():
            Line((15.25, 0), (20, 0))
            Line((20, 0), (20, 15.25))
            Line((20, 15.25), (7.549834435, 15.25))
            Line((7.549834435, 15.25), (7.549834435, 13.25))
            ThreePointArc((7.549834435, 13.25), (13.185171124, 7.662490615), (15.25, 0))
        make_face()
        with BuildLine():
            Line((-15.25, 0), (-15.25, 15.25))
            Line((-15.25, 15.25), (-7.549834435, 15.25))
            Line((-7.549834435, 15.25), (-7.549834435, 13.25))
            ThreePointArc((-7.549834435, 13.25), (-13.185171124, 7.662490615), (-15.25, 0))
        make_face()
    extrude(amount=-SALIENTE_EXTRUIR13_DEPTH)

    # Croquis47 → Cortar-Extruir40 (cut)
    with BuildSketch(Plane.XY.offset(15.25).offset(CORTAR_EXTRUIR40_START)):
        Polygon((15.41228676, 22.352505966), (17, 25.102505966), (15.41228676, 27.852505966), (12.236860279, 27.852505966), (10.649147039, 25.102505966), (12.236860279, 22.352505966), align=None)
        with Locations((13.824573519, 25.102505966)):
            Circle(CROQUIS47_R, mode=Mode.SUBTRACT)
        Polygon((-12.236860279, 22.352505966), (-15.41228676, 22.352505966), (-17, 25.102505966), (-15.41228676, 27.852505966), (-12.236860279, 27.852505966), (-10.649147039, 25.102505966), align=None)
        with Locations(Location((-13.824573519, 25.102505966, 0), (0, 0, 131.421584744))):
            Circle(CROQUIS47_R, mode=Mode.SUBTRACT)
    extrude(amount=-CORTAR_EXTRUIR40_DEPTH, mode=Mode.SUBTRACT)

    # Croquis48 → Cortar-Extruir41 (cut)
    with BuildSketch(Plane.XY.offset(15.25).offset(CORTAR_EXTRUIR41_START)):
        with Locations((13.824573519, 25.102505966)):
            Circle(CROQUIS48_R)
        with Locations((-13.824573519, 25.102505966)):
            Circle(CROQUIS48_R)
    extrude(amount=CORTAR_EXTRUIR41_DEPTH, mode=Mode.SUBTRACT)

    # Croquis49 → Cortar-Extruir42 (cut, two sides)
    with BuildSketch(Plane.XZ.offset(-20)) as cortar_extruir42_sk:
        with Locations((-37.391633796, 1.105513491)):
            Rectangle(CROQUIS49_W, CROQUIS49_H)
    extrude(amount=CORTAR_EXTRUIR42_DEPTH, mode=Mode.SUBTRACT)
    extrude(cortar_extruir42_sk.sketch, amount=-CORTAR_EXTRUIR42_DEPTH_BACK, mode=Mode.SUBTRACT)

    # Croquis51 → Saliente-Extruir14 (add)
    with BuildSketch(Plane(origin=(0, 30, 0), x_dir=(1, 0, 0), z_dir=(0, 1, 0))):
        Circle(CROQUIS51_R)
        with Locations(Location((0, 0, 0), (0, 0, 270))):
            Circle(CROQUIS51_R_2, mode=Mode.SUBTRACT)
    extrude(amount=-SALIENTE_EXTRUIR14_DEPTH)

    # Croquis52 → Cortar-Extruir43 (cut)
    with BuildSketch(Plane(origin=(0, 0, 13.25), x_dir=(-1, 0, 0), z_dir=(0, 0, -1))):
        Polygon((-10.649147039, 25.102505966), (-12.236860279, 27.852505966), (-15.41228676, 27.852505966), (-17, 25.102505966), (-15.41228676, 22.352505966), (-12.236860279, 22.352505966), align=None)
        Polygon((17, 25.102505966), (15.41228676, 27.852505966), (12.236860279, 27.852505966), (10.649147039, 25.102505966), (12.236860279, 22.352505966), (15.41228676, 22.352505966), align=None)
    extrude(amount=CORTAR_EXTRUIR43_DEPTH, mode=Mode.SUBTRACT)

    # Croquis53 → Cortar-Extruir44 (cut)
    with BuildSketch(Plane.XY.offset(-17)):
        Polygon((3.175426481, 25), (1.58771324, 27.75), (-1.58771324, 27.75), (-3.175426481, 25), (-1.58771324, 22.25), (1.58771324, 22.25), align=None)
    extrude(amount=CORTAR_EXTRUIR44_DEPTH, mode=Mode.SUBTRACT)

    # Croquis54 → Cortar-Extruir45 (cut)
    with BuildSketch(Plane.ZY.offset(-17)):
        Polygon((-4.75, 28.175426481), (-7.5, 26.58771324), (-7.5, 23.41228676), (-4.75, 21.824573519), (-2, 23.41228676), (-2, 26.58771324), align=None)
    extrude(amount=CORTAR_EXTRUIR45_DEPTH, mode=Mode.SUBTRACT)

    # Croquis55 → Saliente-Extruir15 (add)
    with BuildSketch(Plane(origin=(0, 30, 0), x_dir=(1, 0, 0), z_dir=(0, 1, 0))):
        with BuildLine():
            Line((-7.549834435, -13.25), (-7.549834435, -15.25))
            Line((-7.549834435, -15.25), (0, -15.25))
            ThreePointArc((0, -15.25), (-3.905124838, -14.741522988), (-7.549834435, -13.25))
        make_face()
        with BuildLine():
            ThreePointArc((7.549834435, -13.25), (3.905124838, -14.741522988), (0, -15.25))
            Line((0, -15.25), (7.549834435, -15.25))
            Line((7.549834435, -15.25), (7.549834435, -13.25))
        make_face()
    extrude(amount=-SALIENTE_EXTRUIR15_DEPTH)


solid = body_2_2.part
